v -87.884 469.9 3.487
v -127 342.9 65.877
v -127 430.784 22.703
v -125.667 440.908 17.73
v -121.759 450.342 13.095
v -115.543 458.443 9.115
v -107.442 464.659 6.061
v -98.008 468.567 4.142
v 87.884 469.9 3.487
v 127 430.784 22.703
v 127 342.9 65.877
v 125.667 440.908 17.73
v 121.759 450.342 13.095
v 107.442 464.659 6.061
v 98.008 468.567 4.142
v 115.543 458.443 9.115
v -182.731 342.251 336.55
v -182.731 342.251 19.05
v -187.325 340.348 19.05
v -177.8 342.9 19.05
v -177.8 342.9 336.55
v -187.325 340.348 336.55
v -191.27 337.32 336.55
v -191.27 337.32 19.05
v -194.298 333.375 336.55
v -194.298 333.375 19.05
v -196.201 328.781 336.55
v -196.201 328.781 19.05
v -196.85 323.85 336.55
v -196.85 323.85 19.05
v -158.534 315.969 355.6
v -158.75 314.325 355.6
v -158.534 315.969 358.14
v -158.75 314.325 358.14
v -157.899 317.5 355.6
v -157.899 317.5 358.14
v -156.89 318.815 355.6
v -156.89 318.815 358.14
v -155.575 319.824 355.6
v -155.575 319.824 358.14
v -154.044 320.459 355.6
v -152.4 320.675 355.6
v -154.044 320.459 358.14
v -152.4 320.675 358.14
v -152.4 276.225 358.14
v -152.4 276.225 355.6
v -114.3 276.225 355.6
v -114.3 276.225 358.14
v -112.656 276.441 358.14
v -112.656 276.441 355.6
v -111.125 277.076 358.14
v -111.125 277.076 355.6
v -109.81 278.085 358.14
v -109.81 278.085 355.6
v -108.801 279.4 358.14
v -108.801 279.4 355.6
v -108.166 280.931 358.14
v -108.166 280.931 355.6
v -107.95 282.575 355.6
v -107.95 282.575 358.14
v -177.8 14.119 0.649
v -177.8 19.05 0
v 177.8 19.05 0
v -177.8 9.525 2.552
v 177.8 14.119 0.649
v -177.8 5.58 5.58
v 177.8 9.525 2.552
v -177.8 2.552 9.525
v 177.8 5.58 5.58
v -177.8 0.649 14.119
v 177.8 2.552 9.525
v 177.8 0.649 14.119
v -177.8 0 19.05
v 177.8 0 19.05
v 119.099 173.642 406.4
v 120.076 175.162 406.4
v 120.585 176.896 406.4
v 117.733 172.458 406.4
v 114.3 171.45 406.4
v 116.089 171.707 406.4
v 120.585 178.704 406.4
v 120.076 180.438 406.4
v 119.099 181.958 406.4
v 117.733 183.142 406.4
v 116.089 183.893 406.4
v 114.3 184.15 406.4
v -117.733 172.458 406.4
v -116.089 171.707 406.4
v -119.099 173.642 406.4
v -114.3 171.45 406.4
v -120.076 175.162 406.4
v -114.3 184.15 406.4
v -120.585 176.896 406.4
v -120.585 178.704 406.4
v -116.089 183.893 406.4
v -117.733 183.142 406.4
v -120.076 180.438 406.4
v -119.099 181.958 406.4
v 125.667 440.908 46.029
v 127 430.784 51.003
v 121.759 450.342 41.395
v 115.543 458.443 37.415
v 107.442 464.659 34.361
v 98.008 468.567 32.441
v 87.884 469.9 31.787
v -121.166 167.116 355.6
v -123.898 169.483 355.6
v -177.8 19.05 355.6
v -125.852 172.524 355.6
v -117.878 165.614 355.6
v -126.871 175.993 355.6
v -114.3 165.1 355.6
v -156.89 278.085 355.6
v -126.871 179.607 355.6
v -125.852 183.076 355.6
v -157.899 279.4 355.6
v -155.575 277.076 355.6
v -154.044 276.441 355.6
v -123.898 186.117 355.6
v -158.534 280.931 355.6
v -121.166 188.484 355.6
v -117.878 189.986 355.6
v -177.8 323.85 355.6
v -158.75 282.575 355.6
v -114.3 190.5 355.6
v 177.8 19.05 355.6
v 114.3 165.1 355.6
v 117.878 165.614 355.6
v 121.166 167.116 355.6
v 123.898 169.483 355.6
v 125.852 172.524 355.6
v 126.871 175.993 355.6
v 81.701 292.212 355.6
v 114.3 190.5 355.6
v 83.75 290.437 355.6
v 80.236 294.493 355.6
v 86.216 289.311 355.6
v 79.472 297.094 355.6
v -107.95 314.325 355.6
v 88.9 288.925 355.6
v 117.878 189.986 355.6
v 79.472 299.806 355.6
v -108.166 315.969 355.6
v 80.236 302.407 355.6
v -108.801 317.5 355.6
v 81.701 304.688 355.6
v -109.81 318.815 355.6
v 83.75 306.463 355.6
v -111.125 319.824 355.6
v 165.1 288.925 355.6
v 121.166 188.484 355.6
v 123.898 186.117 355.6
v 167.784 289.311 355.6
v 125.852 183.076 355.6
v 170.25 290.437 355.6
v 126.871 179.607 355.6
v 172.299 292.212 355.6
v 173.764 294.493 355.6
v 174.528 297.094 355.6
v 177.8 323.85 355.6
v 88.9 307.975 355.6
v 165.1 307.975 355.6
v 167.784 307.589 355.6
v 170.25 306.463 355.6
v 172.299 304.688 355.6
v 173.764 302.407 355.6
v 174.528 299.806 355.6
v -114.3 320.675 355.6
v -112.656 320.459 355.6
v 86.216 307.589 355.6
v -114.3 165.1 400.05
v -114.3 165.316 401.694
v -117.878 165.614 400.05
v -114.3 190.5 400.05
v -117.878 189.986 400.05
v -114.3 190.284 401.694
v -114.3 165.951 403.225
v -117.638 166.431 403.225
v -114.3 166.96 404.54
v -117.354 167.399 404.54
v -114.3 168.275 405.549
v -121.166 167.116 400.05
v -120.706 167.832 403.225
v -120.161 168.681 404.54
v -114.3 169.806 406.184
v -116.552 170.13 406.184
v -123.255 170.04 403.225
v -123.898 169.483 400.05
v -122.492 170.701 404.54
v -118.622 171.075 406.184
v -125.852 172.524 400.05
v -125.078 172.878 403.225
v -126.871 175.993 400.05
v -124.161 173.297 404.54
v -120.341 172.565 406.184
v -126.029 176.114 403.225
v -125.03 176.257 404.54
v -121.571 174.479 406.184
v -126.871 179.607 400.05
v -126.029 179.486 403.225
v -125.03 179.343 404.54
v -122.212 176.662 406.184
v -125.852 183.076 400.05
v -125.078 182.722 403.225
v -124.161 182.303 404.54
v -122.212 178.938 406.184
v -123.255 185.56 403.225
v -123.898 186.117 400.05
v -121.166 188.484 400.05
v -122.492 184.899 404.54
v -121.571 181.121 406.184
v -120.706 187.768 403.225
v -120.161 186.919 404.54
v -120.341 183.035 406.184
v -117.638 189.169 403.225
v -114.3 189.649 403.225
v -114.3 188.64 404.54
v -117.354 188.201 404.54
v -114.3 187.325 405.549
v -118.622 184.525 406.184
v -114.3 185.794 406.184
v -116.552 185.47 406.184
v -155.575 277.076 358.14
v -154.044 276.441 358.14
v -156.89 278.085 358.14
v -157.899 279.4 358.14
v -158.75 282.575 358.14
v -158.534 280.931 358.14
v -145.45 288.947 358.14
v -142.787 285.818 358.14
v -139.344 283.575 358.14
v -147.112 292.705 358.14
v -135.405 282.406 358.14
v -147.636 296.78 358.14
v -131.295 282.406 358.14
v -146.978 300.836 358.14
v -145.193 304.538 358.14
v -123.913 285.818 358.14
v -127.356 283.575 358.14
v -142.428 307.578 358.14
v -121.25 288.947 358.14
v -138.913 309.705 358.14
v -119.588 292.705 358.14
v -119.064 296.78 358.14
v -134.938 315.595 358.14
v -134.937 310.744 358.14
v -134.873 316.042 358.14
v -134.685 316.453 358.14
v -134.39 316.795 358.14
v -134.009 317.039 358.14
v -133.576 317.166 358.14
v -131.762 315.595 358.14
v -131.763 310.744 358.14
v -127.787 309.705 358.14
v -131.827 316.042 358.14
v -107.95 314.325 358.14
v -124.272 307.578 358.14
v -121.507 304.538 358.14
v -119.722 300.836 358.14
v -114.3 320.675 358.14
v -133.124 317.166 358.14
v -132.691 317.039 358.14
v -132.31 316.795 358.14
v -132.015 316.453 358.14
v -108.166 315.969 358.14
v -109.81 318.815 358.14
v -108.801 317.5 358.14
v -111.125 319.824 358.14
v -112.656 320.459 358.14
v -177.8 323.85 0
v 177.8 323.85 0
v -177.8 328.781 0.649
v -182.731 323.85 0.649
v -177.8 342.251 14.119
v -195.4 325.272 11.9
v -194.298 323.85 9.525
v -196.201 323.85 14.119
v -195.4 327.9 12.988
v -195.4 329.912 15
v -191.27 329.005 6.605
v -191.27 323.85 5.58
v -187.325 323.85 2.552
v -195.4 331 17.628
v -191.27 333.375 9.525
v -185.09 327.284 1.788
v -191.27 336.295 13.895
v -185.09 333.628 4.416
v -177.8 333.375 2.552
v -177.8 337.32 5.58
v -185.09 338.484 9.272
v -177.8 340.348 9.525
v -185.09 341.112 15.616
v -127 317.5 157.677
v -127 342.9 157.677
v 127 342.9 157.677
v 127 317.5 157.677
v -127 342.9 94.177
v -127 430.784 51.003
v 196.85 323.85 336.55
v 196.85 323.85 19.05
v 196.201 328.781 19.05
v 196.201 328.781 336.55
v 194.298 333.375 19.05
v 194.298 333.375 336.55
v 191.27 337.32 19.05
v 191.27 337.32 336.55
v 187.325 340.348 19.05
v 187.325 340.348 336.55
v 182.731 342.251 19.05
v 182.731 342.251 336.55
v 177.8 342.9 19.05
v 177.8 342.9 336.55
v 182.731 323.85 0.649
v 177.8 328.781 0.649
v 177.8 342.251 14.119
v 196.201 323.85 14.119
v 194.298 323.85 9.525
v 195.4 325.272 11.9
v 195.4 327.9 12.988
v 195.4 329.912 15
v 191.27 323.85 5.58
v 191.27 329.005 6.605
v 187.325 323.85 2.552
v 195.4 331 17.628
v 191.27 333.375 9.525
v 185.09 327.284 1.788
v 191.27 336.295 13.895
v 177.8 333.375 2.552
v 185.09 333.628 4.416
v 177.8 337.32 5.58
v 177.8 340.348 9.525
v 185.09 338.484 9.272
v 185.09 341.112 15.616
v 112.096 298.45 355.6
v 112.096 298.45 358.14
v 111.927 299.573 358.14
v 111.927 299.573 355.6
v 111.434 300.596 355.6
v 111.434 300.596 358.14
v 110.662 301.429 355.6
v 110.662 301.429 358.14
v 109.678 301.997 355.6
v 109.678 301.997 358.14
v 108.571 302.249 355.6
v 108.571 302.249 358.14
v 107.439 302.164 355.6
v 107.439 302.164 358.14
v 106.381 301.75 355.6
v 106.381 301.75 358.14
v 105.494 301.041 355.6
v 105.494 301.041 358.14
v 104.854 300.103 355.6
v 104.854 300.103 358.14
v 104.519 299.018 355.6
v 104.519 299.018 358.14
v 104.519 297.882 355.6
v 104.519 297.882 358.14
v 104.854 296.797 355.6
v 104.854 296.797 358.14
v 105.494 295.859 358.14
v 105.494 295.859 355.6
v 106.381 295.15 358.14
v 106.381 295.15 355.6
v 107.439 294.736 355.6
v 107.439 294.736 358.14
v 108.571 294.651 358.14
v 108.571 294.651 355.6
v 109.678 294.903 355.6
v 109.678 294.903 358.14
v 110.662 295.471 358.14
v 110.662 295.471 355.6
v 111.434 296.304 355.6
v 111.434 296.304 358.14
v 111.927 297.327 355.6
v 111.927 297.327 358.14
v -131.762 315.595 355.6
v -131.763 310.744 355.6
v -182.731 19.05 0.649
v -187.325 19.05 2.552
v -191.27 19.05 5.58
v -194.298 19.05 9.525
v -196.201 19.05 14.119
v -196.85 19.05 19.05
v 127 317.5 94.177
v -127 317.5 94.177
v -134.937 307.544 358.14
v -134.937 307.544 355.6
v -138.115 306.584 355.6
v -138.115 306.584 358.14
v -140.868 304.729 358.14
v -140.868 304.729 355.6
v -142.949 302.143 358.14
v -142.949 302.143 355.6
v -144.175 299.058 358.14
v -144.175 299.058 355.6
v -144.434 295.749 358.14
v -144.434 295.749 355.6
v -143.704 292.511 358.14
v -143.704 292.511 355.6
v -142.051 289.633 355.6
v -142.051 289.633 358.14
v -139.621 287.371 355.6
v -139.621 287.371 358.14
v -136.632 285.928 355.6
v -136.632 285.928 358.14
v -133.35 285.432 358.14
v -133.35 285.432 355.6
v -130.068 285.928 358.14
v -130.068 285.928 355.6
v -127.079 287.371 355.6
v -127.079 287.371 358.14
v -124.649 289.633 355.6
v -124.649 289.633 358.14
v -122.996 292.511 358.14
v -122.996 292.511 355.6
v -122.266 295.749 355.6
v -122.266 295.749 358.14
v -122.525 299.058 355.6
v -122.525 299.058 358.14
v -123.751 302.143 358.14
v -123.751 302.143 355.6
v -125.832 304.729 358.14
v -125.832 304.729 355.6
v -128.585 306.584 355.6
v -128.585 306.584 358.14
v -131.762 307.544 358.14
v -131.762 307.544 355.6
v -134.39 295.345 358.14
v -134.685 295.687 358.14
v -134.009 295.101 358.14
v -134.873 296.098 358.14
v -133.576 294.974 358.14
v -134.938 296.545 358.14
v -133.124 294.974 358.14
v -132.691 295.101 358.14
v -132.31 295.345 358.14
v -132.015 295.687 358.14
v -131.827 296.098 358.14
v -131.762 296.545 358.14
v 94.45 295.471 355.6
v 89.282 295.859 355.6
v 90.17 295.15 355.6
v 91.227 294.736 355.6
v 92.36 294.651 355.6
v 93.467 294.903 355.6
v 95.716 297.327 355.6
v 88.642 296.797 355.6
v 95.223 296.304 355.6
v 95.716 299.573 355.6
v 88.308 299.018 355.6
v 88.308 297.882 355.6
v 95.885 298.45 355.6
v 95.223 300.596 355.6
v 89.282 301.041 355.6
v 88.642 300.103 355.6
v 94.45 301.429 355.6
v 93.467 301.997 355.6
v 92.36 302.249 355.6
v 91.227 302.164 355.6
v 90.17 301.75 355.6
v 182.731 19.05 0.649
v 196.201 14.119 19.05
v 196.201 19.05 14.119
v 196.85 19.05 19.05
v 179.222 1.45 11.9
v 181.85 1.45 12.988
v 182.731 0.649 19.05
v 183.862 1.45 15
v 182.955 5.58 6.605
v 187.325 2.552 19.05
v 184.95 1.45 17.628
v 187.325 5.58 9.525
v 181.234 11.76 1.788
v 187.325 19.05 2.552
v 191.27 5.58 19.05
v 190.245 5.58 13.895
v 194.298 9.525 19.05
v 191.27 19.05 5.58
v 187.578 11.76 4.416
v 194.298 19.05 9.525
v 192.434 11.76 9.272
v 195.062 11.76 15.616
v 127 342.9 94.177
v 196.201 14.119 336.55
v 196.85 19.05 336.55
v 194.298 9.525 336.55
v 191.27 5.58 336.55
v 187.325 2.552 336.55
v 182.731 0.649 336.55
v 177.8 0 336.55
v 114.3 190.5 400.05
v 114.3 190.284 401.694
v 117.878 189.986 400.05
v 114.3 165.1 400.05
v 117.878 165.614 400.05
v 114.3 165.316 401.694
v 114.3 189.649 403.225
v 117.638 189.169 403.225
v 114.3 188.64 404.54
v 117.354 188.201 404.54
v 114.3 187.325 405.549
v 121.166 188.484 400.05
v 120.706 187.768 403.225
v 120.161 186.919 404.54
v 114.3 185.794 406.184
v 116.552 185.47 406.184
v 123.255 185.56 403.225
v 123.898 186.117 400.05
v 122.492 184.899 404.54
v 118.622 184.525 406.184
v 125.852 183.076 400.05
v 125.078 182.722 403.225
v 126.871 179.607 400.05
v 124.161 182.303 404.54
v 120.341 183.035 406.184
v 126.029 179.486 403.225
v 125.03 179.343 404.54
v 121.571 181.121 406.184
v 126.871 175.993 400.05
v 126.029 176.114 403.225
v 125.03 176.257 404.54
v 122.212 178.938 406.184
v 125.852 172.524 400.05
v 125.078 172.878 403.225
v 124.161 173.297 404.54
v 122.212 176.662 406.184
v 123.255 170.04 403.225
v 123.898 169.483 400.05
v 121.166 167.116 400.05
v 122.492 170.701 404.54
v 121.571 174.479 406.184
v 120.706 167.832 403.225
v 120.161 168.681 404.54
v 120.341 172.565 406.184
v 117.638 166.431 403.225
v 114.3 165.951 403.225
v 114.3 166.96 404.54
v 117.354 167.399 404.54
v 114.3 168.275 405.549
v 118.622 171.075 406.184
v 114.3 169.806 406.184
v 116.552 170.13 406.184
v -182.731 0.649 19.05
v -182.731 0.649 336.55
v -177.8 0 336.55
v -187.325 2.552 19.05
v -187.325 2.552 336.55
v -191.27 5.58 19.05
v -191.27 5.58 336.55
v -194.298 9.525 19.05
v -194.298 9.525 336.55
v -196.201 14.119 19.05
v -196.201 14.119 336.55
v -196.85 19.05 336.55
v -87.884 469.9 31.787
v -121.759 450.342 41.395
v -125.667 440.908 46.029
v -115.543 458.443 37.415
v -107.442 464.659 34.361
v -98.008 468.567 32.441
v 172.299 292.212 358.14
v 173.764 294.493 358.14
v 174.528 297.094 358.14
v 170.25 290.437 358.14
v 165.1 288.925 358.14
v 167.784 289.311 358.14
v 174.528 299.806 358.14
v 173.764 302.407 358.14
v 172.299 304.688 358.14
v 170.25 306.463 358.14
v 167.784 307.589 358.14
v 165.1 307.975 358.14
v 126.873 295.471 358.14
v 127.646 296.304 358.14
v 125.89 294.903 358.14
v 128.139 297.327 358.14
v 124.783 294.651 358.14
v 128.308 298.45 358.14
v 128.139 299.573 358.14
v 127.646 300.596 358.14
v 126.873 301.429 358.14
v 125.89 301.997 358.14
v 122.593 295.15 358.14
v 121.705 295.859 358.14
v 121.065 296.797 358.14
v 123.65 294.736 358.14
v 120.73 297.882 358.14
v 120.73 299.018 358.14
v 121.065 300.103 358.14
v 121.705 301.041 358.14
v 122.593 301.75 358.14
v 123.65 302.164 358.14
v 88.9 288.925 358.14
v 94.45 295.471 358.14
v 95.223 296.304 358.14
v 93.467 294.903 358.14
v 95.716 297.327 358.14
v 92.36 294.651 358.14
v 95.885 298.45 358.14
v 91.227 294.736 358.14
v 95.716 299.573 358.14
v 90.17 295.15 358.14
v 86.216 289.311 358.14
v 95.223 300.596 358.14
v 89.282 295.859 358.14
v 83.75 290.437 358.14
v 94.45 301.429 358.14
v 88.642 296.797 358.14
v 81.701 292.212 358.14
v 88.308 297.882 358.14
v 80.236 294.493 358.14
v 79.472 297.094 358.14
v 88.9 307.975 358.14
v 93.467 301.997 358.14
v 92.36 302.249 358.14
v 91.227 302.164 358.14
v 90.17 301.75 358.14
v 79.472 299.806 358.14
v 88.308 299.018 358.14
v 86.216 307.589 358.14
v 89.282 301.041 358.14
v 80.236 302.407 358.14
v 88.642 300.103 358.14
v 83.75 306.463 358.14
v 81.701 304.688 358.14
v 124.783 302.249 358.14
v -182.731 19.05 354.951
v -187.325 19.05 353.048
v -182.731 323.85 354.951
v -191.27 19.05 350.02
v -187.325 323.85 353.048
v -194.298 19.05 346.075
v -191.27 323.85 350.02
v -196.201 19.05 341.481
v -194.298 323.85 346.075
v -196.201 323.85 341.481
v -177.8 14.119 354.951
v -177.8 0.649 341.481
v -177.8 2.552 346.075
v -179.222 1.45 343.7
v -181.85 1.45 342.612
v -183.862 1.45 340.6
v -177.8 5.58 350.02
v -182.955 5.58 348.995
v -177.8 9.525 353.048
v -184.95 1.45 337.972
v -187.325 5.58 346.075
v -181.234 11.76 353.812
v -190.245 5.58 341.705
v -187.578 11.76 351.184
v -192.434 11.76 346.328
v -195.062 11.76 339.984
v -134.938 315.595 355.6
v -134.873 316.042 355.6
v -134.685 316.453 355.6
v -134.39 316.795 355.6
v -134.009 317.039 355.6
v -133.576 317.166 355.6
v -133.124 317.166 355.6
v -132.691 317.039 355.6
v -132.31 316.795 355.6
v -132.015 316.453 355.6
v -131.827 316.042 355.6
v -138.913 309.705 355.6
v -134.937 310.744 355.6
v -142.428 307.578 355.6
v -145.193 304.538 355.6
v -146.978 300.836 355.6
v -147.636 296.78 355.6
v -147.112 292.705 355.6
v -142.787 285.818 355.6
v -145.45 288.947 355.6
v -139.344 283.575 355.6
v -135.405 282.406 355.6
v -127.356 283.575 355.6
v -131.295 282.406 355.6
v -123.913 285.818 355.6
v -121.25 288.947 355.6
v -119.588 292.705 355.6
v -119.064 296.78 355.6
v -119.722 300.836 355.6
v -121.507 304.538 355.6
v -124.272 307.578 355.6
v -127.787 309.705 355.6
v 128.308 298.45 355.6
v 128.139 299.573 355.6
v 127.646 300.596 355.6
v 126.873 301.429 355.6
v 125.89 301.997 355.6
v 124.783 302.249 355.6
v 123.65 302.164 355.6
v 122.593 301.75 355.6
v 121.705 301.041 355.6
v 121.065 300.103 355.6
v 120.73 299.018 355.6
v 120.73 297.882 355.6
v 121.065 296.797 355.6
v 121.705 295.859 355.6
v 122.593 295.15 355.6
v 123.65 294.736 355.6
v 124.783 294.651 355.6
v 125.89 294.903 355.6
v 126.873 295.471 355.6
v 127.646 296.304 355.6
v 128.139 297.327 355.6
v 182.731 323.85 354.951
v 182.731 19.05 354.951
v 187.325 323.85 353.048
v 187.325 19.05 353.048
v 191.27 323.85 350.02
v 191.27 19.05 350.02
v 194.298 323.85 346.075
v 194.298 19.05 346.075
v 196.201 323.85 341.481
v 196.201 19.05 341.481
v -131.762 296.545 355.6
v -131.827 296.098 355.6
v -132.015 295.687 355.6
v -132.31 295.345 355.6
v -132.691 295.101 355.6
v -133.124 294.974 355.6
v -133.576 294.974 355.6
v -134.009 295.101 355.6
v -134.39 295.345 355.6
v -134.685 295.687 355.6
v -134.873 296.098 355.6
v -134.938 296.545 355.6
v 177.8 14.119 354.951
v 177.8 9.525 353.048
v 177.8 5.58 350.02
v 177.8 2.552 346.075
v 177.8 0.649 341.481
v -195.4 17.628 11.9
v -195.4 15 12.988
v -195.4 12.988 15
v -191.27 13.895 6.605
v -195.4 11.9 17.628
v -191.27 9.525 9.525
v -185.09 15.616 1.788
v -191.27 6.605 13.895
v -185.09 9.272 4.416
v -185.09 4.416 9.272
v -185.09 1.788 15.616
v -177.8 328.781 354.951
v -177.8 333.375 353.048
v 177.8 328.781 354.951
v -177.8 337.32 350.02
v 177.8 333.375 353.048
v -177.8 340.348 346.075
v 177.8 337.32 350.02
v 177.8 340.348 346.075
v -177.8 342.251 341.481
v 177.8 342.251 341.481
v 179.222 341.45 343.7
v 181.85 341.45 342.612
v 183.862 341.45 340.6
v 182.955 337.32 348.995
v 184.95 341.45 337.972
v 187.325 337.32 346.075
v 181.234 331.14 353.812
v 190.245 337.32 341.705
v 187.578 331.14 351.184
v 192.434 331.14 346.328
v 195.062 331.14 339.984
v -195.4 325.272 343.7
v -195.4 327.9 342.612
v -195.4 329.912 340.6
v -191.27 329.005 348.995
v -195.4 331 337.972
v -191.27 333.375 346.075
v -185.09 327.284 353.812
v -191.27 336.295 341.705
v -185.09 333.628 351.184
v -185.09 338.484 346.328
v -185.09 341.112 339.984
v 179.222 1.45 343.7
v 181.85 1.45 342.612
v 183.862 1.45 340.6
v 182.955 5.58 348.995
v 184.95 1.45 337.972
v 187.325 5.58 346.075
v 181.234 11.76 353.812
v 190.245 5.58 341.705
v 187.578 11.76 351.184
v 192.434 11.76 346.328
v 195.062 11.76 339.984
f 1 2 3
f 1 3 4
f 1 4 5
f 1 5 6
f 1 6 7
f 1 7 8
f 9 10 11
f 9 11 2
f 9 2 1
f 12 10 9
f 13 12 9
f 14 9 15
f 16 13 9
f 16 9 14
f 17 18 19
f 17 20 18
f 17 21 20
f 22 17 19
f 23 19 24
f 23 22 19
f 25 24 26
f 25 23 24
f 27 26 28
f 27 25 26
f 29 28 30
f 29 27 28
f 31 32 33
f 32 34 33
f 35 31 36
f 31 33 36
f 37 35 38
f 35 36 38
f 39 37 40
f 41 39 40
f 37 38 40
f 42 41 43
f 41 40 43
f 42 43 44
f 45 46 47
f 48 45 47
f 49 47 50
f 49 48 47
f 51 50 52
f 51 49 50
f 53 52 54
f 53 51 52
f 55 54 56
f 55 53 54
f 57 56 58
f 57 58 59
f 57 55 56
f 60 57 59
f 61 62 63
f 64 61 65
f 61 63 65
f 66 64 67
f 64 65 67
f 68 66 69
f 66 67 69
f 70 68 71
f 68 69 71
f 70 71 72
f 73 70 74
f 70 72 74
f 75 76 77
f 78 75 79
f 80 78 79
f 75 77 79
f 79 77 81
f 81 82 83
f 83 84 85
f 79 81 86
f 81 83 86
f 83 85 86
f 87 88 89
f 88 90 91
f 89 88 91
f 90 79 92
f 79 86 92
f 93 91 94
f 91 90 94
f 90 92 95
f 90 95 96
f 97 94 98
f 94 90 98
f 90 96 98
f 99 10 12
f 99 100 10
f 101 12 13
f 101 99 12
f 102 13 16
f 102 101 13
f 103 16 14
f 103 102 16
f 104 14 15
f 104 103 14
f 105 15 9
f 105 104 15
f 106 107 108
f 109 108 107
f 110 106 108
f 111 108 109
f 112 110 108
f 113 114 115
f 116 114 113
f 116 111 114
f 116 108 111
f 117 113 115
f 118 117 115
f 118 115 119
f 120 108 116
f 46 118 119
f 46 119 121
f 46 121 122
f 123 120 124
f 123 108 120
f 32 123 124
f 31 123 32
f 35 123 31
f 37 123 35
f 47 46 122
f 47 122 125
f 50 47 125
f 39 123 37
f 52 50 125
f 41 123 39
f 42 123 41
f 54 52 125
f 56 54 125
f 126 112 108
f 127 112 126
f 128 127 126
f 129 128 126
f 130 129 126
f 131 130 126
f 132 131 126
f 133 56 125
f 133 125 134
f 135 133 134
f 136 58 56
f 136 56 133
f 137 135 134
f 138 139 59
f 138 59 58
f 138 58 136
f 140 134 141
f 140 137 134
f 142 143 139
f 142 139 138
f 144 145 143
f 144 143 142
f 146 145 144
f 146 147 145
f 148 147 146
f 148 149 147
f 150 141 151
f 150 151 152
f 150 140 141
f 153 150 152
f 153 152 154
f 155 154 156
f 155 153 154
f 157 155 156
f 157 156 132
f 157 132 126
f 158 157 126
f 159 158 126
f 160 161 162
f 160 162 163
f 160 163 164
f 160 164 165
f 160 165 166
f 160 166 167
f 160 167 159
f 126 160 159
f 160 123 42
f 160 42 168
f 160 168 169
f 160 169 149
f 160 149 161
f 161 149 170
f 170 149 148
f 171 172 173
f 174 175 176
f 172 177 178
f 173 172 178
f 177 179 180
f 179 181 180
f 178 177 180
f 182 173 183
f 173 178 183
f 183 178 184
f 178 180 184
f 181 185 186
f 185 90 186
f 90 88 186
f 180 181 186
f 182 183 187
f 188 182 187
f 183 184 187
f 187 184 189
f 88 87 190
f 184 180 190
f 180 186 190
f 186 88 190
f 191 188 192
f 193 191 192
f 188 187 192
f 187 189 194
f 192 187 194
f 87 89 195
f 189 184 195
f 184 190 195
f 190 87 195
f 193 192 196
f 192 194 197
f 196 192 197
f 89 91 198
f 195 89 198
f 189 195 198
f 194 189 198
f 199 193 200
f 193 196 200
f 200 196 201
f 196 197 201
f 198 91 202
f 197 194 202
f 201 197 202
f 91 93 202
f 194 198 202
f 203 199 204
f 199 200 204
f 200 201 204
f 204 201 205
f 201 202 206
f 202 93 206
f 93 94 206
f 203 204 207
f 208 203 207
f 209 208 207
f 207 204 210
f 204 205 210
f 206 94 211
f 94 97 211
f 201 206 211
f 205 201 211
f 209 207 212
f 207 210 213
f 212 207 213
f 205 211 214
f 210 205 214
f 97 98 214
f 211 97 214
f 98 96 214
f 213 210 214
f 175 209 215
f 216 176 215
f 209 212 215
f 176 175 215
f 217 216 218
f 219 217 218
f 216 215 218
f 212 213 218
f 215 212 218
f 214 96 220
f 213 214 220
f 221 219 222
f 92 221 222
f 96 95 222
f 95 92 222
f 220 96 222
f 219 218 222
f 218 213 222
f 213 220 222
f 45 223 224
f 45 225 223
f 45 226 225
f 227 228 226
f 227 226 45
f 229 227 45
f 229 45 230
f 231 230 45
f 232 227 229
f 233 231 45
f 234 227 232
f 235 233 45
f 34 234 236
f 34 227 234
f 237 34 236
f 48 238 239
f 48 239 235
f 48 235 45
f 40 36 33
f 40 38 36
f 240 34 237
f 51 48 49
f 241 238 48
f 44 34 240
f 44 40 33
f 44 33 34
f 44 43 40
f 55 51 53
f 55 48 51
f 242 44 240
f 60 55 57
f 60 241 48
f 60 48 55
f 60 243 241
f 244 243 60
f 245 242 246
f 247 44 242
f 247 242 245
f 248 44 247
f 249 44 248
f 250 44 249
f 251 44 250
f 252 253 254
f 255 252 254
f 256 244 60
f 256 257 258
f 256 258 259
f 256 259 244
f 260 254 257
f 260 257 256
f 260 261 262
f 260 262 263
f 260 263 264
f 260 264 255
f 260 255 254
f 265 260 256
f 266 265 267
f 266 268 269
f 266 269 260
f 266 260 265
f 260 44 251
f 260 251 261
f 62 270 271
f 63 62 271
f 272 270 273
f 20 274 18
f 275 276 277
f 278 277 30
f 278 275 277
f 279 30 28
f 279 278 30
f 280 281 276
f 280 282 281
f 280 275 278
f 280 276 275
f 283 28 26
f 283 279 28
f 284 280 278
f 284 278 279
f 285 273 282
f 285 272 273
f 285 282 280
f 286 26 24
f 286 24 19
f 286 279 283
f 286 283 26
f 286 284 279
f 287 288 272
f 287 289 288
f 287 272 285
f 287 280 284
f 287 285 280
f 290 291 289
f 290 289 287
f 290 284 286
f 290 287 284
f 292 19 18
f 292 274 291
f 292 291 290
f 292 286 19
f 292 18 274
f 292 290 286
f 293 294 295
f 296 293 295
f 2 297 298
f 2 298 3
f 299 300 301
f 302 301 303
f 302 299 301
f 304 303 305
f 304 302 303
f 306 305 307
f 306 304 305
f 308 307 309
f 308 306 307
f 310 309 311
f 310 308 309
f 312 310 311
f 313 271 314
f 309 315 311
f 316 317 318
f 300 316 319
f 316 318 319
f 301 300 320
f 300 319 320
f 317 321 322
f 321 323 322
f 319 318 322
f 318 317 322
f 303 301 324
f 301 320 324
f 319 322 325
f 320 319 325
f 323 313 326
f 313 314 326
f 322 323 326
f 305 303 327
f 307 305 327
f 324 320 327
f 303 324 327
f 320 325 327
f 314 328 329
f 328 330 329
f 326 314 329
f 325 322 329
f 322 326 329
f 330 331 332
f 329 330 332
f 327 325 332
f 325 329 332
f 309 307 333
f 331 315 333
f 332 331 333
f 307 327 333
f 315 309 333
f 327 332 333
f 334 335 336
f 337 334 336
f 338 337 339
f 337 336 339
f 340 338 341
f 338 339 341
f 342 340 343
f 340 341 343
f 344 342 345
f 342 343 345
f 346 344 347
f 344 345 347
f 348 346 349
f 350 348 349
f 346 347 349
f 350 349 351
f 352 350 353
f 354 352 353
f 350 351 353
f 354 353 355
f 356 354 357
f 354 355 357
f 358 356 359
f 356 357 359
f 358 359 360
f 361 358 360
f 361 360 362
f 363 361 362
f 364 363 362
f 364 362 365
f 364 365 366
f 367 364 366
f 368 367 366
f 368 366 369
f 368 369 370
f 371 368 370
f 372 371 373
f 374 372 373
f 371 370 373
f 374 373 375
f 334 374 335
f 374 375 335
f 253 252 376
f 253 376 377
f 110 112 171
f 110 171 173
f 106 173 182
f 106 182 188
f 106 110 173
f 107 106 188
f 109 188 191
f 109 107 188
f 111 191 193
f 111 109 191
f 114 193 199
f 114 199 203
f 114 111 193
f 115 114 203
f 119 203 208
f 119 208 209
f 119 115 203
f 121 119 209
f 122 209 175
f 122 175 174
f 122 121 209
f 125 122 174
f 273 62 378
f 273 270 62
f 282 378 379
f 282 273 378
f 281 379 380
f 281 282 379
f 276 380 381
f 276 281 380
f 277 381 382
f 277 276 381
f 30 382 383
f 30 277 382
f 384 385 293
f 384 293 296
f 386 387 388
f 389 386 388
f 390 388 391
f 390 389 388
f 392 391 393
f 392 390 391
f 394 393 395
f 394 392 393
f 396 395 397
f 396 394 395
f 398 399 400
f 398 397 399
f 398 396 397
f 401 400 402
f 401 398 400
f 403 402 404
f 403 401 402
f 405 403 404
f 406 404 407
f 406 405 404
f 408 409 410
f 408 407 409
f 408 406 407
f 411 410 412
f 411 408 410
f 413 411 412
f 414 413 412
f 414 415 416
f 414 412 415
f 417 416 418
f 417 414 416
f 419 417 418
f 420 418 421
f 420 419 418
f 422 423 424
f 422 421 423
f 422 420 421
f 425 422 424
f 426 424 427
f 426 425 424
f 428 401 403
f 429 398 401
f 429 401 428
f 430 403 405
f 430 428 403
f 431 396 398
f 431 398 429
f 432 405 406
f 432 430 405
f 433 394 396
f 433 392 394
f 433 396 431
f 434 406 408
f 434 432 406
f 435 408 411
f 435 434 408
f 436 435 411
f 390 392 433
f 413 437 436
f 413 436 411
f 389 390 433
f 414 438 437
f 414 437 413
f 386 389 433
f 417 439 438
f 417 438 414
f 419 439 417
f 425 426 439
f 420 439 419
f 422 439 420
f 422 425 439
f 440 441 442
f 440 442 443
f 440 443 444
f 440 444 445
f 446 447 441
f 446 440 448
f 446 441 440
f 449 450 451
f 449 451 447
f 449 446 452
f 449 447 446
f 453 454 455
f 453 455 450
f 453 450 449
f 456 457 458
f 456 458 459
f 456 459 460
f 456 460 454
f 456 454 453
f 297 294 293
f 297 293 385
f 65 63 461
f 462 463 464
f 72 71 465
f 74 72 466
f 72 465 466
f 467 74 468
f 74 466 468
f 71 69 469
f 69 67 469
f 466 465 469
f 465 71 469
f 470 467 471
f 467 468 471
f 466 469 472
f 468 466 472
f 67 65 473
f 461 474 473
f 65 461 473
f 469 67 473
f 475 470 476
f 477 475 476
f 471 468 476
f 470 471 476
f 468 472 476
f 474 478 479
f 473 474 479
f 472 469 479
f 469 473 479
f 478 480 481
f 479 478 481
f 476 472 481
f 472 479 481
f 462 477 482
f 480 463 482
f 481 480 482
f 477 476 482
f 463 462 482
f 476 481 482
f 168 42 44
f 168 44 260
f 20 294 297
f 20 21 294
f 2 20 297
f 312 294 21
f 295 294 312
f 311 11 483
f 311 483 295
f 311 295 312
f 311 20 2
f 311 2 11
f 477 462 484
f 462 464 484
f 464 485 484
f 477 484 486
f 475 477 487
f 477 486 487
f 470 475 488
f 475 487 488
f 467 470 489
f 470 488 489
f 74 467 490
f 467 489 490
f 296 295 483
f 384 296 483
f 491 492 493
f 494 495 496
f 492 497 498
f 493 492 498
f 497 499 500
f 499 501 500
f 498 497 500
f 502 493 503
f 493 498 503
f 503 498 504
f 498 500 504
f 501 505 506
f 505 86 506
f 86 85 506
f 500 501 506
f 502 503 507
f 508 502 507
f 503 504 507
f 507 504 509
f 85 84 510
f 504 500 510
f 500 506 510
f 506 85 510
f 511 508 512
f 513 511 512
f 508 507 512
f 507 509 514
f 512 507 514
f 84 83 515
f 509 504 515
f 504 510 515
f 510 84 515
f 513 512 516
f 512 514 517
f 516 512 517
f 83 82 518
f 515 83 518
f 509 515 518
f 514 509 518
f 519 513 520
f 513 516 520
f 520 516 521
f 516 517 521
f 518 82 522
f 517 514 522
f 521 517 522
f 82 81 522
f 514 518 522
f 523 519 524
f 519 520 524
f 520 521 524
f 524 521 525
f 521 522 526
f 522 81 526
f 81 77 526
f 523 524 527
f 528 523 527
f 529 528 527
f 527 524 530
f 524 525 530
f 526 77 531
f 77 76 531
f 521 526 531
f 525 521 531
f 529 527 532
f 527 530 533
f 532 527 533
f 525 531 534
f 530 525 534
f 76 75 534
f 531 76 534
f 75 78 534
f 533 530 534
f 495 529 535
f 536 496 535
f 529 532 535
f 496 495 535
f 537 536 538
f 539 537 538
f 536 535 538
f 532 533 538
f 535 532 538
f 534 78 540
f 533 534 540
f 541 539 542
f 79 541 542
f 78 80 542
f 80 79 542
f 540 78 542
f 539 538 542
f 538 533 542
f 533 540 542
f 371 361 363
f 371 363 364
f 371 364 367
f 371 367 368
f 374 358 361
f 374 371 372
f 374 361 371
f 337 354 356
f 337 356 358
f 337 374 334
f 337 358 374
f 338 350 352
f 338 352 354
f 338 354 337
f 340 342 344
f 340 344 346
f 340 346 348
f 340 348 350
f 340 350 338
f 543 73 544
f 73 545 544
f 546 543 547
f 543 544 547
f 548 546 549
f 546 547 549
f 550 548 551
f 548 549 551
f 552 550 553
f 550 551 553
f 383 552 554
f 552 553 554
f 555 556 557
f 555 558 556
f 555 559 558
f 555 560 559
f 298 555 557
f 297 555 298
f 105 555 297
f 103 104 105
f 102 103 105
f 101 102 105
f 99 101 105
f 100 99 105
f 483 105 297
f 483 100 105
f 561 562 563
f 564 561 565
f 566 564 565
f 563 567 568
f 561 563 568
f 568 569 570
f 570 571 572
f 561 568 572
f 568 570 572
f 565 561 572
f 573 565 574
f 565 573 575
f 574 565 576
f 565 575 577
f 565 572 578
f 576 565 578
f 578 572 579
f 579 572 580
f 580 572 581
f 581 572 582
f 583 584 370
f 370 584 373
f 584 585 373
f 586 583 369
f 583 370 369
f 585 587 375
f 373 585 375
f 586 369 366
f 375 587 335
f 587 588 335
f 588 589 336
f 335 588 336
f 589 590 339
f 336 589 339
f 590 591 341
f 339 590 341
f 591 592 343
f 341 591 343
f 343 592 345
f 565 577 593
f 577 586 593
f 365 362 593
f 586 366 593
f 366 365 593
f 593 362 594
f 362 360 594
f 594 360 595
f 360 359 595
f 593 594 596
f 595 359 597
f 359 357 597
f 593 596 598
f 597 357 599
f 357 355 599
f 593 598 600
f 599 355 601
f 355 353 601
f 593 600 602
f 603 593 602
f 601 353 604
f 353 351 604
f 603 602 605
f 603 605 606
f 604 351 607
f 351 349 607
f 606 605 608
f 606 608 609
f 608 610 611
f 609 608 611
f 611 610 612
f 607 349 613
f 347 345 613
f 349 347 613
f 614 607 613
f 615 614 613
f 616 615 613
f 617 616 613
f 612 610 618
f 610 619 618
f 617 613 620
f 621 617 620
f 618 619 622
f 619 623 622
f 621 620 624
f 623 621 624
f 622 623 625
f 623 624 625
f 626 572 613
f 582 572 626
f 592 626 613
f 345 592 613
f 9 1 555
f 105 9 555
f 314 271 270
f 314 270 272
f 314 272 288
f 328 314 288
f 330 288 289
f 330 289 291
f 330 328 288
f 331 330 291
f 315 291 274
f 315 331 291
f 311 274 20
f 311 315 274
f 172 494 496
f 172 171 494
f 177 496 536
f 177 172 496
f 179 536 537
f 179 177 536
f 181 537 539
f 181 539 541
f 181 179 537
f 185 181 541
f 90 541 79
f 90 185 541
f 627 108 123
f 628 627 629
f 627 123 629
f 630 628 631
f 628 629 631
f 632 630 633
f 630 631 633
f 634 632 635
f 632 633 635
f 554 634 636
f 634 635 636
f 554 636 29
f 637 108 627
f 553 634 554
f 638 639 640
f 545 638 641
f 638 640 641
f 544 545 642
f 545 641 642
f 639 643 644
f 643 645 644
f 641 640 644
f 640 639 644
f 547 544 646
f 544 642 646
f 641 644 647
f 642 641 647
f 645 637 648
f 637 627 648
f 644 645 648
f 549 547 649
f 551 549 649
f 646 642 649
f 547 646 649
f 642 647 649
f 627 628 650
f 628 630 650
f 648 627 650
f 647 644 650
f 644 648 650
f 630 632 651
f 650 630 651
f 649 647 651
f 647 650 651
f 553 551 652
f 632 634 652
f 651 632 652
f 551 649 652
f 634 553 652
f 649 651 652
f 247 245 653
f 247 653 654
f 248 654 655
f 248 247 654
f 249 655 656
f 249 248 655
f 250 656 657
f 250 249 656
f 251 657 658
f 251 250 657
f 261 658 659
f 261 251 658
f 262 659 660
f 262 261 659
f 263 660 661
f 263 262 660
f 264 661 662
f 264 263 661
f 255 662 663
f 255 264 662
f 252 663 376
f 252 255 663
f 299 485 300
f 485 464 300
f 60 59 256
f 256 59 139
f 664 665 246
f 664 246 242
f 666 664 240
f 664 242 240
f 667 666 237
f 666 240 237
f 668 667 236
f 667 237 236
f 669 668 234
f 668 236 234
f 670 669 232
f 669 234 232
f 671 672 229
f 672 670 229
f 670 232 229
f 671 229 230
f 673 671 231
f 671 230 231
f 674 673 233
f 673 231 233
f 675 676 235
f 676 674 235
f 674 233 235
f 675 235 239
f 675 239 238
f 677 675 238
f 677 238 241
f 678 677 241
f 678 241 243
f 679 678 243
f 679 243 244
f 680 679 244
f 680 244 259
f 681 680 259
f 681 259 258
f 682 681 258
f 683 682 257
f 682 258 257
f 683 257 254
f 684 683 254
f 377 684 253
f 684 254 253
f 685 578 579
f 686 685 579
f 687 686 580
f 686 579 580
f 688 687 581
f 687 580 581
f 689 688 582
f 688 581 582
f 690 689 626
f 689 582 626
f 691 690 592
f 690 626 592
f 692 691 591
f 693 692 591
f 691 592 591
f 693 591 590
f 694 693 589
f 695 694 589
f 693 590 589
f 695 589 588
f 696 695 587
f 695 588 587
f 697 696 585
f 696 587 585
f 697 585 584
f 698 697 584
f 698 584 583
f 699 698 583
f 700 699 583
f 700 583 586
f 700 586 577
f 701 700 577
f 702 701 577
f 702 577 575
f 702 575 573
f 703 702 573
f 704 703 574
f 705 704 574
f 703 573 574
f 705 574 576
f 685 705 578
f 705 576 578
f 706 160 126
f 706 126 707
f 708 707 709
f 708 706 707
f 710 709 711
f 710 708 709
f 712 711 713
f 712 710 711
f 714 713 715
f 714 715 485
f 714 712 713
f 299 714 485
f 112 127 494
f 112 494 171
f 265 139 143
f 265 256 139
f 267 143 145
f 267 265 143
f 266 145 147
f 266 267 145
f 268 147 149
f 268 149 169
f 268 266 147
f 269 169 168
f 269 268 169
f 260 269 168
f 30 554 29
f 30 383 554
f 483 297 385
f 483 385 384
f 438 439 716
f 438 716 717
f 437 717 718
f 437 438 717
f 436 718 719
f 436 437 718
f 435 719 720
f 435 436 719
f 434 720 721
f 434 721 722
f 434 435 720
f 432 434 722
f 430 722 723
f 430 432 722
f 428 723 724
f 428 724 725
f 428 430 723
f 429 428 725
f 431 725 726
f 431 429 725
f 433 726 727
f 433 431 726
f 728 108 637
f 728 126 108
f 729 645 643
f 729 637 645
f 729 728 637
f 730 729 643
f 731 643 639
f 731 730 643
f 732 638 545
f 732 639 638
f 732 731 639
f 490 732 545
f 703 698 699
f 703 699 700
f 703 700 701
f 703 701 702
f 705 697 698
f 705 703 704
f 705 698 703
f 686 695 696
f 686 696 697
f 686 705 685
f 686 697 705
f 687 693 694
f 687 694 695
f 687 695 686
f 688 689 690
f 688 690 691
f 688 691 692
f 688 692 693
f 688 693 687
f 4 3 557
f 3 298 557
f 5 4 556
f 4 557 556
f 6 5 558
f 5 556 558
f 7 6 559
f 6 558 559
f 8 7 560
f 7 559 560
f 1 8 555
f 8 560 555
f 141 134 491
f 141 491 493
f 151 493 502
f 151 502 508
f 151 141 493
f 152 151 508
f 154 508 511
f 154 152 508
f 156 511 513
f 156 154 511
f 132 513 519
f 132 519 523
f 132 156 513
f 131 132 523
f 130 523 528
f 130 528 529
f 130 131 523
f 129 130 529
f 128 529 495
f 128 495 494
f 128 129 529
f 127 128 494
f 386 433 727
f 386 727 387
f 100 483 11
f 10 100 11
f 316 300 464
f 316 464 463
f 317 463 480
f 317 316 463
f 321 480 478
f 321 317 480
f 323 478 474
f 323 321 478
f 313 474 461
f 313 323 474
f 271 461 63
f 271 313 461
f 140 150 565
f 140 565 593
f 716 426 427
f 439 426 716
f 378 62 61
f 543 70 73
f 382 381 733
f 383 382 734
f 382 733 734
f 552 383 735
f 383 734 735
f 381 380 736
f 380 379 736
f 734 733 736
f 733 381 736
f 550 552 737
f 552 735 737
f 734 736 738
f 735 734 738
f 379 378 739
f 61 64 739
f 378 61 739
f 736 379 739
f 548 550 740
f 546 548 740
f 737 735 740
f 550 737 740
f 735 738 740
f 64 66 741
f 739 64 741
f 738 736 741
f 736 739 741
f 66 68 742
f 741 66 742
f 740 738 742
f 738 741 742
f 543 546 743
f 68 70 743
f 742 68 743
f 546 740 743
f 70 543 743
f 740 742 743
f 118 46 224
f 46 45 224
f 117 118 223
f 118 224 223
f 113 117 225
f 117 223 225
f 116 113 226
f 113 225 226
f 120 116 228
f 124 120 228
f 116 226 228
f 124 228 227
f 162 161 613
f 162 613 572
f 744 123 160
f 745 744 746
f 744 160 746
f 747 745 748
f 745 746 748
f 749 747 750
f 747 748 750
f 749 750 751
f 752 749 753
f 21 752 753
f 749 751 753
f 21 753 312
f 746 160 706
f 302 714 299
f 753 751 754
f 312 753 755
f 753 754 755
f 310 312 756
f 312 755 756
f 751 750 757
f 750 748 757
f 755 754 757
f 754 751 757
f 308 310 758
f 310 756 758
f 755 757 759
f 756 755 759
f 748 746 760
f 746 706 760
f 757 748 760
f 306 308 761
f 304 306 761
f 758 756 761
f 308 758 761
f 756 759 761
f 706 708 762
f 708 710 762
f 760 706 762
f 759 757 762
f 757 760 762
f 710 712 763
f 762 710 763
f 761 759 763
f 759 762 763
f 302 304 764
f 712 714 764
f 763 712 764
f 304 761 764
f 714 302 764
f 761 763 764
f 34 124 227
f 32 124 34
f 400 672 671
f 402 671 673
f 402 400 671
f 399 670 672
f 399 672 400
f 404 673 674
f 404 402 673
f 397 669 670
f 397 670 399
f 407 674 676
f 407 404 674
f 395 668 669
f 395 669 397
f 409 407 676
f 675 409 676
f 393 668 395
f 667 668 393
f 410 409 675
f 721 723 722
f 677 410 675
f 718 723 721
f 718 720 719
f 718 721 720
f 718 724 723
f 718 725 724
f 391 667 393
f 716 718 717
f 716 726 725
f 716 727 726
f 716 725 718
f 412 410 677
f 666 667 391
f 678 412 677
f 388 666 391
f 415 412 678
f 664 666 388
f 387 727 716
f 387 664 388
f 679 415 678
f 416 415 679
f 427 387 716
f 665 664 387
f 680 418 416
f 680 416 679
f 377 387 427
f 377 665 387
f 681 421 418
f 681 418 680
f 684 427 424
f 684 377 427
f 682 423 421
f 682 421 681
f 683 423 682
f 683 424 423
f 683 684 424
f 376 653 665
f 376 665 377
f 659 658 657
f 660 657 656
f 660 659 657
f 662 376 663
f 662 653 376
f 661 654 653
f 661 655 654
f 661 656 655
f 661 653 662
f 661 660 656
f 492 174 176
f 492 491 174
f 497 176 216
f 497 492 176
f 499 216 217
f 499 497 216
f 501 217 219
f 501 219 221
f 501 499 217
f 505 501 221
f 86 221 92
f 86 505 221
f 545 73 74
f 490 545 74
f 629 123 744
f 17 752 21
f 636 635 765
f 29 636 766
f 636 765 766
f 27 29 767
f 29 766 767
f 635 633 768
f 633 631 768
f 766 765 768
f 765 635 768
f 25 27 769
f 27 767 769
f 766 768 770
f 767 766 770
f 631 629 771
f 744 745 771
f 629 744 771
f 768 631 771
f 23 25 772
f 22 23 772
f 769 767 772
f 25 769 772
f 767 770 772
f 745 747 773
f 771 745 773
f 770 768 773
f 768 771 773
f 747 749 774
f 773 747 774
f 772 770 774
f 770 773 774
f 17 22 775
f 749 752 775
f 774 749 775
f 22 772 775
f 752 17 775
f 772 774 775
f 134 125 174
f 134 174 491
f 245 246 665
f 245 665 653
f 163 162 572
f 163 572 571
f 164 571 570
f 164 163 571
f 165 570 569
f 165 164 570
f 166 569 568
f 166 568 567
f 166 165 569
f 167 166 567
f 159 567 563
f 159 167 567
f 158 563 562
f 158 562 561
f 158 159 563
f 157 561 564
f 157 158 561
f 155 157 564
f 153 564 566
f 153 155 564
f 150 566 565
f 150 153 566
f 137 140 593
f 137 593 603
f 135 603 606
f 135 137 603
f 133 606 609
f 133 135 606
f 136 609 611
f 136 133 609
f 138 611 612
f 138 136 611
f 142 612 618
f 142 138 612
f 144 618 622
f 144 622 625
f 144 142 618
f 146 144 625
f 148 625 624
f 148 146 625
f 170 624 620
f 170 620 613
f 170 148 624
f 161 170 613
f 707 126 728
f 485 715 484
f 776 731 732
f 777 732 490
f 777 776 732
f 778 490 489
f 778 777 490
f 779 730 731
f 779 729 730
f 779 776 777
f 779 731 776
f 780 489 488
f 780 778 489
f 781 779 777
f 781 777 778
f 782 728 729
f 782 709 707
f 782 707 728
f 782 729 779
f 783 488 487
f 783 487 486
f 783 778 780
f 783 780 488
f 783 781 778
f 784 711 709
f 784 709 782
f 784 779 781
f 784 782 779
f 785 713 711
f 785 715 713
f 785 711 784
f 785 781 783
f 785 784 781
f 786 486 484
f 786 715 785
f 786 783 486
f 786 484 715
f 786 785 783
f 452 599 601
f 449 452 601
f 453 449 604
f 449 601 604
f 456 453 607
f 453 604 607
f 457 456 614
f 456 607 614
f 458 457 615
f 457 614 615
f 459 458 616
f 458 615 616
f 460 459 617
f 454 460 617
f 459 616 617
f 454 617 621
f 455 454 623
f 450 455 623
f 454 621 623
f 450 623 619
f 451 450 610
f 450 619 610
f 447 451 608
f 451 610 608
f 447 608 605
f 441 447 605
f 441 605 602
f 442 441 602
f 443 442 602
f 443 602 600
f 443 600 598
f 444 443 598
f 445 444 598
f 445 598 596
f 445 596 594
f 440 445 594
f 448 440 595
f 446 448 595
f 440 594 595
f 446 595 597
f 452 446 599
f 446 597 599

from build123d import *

# Parameters (mm, degrees)
SKETCH1_W           = 393.7
SKETCH1_H           = 342.9
BOSS_EXTRUDE1_DEPTH = 355.6
SKETCH2_W           = 50.8
SKETCH2_H           = 44.45
BOSS_EXTRUDE2_DEPTH = 2.54
BOSS_EXTRUDE3_DEPTH = 2.54
SKETCH4_R           = 3.81
CUT_EXTRUDE1_DEPTH  = 2.54
BOSS_EXTRUDE4_DEPTH = 50.8
FILLET1_R           = 6.35
FILLET2_R           = 6.35
SKETCH6_R           = 14.2875
SKETCH6_R_2         = 11.1125
CUT_EXTRUDE2_DEPTH  = 2.54
FILLET3_R           = 19.05
BOSS_EXTRUDE5_DEPTH = 127
FILLET4_R           = 39.116
SKETCH8_W           = 254
SKETCH8_H           = 63.5
CUT_EXTRUDE3_DEPTH  = 25.4


with BuildPart() as part:
    # Sketch1 → Boss-Extrude1 (new body)
    with BuildSketch(Plane.XY):
        with Locations((0, 171.45)):
            Rectangle(SKETCH1_W, SKETCH1_H)
    extrude(amount=BOSS_EXTRUDE1_DEPTH)

    # Sketch2 → Boss-Extrude2 (add)
    with BuildSketch(Plane.XY.offset(355.6)):
        with Locations((-133.35, 298.45)):
            Rectangle(SKETCH2_W, SKETCH2_H)
    extrude(amount=BOSS_EXTRUDE2_DEPTH)

    # Sketch3 → Boss-Extrude3 (add)
    with BuildSketch(Plane.XY.offset(355.6)):
        with BuildLine():
            Line((88.9, 307.975), (165.1, 307.975))
            ThreePointArc((165.1, 307.975), (174.625, 298.45), (165.1, 288.925))
            Line((165.1, 288.925), (88.9, 288.925))
            ThreePointArc((88.9, 288.925), (79.375, 298.45), (88.9, 307.975))
        make_face()
    extrude(amount=BOSS_EXTRUDE3_DEPTH)

    # Sketch4 → Cut-Extrude1 (cut)
    with BuildSketch(Plane.XY.offset(358.14)):
        with Locations((92.075, 298.45)):
            Circle(SKETCH4_R)
        with Locations((108.286467636, 298.45)):
            Circle(SKETCH4_R)
        with Locations((124.497935272, 298.45)):
            Circle(SKETCH4_R)
    extrude(amount=-CUT_EXTRUDE1_DEPTH, mode=Mode.SUBTRACT)

    # Sketch5 → Boss-Extrude4 (add)
    with BuildSketch(Plane.XY.offset(355.6)):
        with BuildLine():
            Line((-114.3, 190.5), (114.3, 190.5))
            ThreePointArc((114.3, 190.5), (127, 177.8), (114.3, 165.1))
            Line((114.3, 165.1), (-114.3, 165.1))
            ThreePointArc((-114.3, 165.1), (-127, 177.8), (-114.3, 190.5))
        make_face()
    extrude(amount=BOSS_EXTRUDE4_DEPTH)

    # Fillet1
    fillet1_edges = [part.edges().sort_by_distance(p)[0] for p in [
        (-127, 177.8, 406.4),
        (0, 165.1, 406.4),
        (127, 177.8, 406.4),
        (0, 190.5, 406.4),
    ]]
    fillet(fillet1_edges, radius=FILLET1_R)

    # Fillet2
    fillet2_edges = [part.edges().sort_by_distance(p)[0] for p in [
        (-107.95, 276.225, 356.87),
        (-107.95, 320.675, 356.87),
        (-158.75, 320.675, 356.87),
        (-158.75, 276.225, 356.87),
    ]]
    fillet(fillet2_edges, radius=FILLET2_R)

    # Sketch6 → Cut-Extrude2 (cut)
    # profile 1 of 2: a face of its own
    with BuildSketch(Plane.XY.offset(358.14)):
        with Locations((-133.35, 296.545)):
            Circle(SKETCH6_R)
        with Locations((-133.35, 296.545)):
            Circle(SKETCH6_R_2, mode=Mode.SUBTRACT)
    # profile 2 of 2: a face of its own
    with BuildSketch(Plane.XY.offset(358.14)):
        with BuildLine():
            Line((-134.9375, 296.545), (-134.9375, 315.595))
            ThreePointArc((-134.9375, 315.595), (-133.35, 317.1825), (-131.7625, 315.595))
            Line((-131.7625, 315.595), (-131.7625, 296.545))
            ThreePointArc((-131.7625, 296.545), (-133.35, 294.9575), (-134.9375, 296.545))
        make_face()
    extrude(amount=-CUT_EXTRUDE2_DEPTH, mode=Mode.SUBTRACT)

    # Fillet3
    fillet3_edges = [part.edges().sort_by_distance(p)[0] for p in [
        (196.85, 171.45, 355.6),
        (0, 342.9, 355.6),
        (-196.85, 171.45, 355.6),
        (0, 342.9, 0),
        (196.85, 171.45, 0),
        (0, 0, 0),
        (-196.85, 171.45, 0),
        (0, 0, 355.6),
        (-196.85, 342.9, 177.8),
        (196.85, 342.9, 177.8),
        (196.85, 0, 177.8),
        (-196.85, 0, 177.8),
    ]]
    fillet(fillet3_edges, radius=FILLET3_R)

    # Sketch7 → Boss-Extrude5 (add, symmetric)
    with BuildSketch(Plane(origin=(0, 0, 0), x_dir=(0, 0, -1), z_dir=(1, 0, 0))):
        Polygon((-65.877338054, 342.9), (-3.487013452, 469.9), (-31.786520589, 469.9), (-94.17684519, 342.9), align=None)
    extrude(amount=BOSS_EXTRUDE5_DEPTH, both=True)

    # Fillet4
    fillet4_edges = [part.edges().sort_by_distance(p)[0] for p in [
        (-127, 469.9, 17.636767021),
        (127, 469.9, 17.636767021),
    ]]
    fillet(fillet4_edges, radius=FILLET4_R)

    # Sketch8 → Cut-Extrude3 (cut)
    with BuildSketch(Plane(origin=(0, 342.9, 0), x_dir=(1, 0, 0), z_dir=(0, 1, 0))):
        with Locations((0, -125.92684519)):
            Rectangle(SKETCH8_W, SKETCH8_H)
    extrude(amount=-CUT_EXTRUDE3_DEPTH, mode=Mode.SUBTRACT)


solid = part.part
